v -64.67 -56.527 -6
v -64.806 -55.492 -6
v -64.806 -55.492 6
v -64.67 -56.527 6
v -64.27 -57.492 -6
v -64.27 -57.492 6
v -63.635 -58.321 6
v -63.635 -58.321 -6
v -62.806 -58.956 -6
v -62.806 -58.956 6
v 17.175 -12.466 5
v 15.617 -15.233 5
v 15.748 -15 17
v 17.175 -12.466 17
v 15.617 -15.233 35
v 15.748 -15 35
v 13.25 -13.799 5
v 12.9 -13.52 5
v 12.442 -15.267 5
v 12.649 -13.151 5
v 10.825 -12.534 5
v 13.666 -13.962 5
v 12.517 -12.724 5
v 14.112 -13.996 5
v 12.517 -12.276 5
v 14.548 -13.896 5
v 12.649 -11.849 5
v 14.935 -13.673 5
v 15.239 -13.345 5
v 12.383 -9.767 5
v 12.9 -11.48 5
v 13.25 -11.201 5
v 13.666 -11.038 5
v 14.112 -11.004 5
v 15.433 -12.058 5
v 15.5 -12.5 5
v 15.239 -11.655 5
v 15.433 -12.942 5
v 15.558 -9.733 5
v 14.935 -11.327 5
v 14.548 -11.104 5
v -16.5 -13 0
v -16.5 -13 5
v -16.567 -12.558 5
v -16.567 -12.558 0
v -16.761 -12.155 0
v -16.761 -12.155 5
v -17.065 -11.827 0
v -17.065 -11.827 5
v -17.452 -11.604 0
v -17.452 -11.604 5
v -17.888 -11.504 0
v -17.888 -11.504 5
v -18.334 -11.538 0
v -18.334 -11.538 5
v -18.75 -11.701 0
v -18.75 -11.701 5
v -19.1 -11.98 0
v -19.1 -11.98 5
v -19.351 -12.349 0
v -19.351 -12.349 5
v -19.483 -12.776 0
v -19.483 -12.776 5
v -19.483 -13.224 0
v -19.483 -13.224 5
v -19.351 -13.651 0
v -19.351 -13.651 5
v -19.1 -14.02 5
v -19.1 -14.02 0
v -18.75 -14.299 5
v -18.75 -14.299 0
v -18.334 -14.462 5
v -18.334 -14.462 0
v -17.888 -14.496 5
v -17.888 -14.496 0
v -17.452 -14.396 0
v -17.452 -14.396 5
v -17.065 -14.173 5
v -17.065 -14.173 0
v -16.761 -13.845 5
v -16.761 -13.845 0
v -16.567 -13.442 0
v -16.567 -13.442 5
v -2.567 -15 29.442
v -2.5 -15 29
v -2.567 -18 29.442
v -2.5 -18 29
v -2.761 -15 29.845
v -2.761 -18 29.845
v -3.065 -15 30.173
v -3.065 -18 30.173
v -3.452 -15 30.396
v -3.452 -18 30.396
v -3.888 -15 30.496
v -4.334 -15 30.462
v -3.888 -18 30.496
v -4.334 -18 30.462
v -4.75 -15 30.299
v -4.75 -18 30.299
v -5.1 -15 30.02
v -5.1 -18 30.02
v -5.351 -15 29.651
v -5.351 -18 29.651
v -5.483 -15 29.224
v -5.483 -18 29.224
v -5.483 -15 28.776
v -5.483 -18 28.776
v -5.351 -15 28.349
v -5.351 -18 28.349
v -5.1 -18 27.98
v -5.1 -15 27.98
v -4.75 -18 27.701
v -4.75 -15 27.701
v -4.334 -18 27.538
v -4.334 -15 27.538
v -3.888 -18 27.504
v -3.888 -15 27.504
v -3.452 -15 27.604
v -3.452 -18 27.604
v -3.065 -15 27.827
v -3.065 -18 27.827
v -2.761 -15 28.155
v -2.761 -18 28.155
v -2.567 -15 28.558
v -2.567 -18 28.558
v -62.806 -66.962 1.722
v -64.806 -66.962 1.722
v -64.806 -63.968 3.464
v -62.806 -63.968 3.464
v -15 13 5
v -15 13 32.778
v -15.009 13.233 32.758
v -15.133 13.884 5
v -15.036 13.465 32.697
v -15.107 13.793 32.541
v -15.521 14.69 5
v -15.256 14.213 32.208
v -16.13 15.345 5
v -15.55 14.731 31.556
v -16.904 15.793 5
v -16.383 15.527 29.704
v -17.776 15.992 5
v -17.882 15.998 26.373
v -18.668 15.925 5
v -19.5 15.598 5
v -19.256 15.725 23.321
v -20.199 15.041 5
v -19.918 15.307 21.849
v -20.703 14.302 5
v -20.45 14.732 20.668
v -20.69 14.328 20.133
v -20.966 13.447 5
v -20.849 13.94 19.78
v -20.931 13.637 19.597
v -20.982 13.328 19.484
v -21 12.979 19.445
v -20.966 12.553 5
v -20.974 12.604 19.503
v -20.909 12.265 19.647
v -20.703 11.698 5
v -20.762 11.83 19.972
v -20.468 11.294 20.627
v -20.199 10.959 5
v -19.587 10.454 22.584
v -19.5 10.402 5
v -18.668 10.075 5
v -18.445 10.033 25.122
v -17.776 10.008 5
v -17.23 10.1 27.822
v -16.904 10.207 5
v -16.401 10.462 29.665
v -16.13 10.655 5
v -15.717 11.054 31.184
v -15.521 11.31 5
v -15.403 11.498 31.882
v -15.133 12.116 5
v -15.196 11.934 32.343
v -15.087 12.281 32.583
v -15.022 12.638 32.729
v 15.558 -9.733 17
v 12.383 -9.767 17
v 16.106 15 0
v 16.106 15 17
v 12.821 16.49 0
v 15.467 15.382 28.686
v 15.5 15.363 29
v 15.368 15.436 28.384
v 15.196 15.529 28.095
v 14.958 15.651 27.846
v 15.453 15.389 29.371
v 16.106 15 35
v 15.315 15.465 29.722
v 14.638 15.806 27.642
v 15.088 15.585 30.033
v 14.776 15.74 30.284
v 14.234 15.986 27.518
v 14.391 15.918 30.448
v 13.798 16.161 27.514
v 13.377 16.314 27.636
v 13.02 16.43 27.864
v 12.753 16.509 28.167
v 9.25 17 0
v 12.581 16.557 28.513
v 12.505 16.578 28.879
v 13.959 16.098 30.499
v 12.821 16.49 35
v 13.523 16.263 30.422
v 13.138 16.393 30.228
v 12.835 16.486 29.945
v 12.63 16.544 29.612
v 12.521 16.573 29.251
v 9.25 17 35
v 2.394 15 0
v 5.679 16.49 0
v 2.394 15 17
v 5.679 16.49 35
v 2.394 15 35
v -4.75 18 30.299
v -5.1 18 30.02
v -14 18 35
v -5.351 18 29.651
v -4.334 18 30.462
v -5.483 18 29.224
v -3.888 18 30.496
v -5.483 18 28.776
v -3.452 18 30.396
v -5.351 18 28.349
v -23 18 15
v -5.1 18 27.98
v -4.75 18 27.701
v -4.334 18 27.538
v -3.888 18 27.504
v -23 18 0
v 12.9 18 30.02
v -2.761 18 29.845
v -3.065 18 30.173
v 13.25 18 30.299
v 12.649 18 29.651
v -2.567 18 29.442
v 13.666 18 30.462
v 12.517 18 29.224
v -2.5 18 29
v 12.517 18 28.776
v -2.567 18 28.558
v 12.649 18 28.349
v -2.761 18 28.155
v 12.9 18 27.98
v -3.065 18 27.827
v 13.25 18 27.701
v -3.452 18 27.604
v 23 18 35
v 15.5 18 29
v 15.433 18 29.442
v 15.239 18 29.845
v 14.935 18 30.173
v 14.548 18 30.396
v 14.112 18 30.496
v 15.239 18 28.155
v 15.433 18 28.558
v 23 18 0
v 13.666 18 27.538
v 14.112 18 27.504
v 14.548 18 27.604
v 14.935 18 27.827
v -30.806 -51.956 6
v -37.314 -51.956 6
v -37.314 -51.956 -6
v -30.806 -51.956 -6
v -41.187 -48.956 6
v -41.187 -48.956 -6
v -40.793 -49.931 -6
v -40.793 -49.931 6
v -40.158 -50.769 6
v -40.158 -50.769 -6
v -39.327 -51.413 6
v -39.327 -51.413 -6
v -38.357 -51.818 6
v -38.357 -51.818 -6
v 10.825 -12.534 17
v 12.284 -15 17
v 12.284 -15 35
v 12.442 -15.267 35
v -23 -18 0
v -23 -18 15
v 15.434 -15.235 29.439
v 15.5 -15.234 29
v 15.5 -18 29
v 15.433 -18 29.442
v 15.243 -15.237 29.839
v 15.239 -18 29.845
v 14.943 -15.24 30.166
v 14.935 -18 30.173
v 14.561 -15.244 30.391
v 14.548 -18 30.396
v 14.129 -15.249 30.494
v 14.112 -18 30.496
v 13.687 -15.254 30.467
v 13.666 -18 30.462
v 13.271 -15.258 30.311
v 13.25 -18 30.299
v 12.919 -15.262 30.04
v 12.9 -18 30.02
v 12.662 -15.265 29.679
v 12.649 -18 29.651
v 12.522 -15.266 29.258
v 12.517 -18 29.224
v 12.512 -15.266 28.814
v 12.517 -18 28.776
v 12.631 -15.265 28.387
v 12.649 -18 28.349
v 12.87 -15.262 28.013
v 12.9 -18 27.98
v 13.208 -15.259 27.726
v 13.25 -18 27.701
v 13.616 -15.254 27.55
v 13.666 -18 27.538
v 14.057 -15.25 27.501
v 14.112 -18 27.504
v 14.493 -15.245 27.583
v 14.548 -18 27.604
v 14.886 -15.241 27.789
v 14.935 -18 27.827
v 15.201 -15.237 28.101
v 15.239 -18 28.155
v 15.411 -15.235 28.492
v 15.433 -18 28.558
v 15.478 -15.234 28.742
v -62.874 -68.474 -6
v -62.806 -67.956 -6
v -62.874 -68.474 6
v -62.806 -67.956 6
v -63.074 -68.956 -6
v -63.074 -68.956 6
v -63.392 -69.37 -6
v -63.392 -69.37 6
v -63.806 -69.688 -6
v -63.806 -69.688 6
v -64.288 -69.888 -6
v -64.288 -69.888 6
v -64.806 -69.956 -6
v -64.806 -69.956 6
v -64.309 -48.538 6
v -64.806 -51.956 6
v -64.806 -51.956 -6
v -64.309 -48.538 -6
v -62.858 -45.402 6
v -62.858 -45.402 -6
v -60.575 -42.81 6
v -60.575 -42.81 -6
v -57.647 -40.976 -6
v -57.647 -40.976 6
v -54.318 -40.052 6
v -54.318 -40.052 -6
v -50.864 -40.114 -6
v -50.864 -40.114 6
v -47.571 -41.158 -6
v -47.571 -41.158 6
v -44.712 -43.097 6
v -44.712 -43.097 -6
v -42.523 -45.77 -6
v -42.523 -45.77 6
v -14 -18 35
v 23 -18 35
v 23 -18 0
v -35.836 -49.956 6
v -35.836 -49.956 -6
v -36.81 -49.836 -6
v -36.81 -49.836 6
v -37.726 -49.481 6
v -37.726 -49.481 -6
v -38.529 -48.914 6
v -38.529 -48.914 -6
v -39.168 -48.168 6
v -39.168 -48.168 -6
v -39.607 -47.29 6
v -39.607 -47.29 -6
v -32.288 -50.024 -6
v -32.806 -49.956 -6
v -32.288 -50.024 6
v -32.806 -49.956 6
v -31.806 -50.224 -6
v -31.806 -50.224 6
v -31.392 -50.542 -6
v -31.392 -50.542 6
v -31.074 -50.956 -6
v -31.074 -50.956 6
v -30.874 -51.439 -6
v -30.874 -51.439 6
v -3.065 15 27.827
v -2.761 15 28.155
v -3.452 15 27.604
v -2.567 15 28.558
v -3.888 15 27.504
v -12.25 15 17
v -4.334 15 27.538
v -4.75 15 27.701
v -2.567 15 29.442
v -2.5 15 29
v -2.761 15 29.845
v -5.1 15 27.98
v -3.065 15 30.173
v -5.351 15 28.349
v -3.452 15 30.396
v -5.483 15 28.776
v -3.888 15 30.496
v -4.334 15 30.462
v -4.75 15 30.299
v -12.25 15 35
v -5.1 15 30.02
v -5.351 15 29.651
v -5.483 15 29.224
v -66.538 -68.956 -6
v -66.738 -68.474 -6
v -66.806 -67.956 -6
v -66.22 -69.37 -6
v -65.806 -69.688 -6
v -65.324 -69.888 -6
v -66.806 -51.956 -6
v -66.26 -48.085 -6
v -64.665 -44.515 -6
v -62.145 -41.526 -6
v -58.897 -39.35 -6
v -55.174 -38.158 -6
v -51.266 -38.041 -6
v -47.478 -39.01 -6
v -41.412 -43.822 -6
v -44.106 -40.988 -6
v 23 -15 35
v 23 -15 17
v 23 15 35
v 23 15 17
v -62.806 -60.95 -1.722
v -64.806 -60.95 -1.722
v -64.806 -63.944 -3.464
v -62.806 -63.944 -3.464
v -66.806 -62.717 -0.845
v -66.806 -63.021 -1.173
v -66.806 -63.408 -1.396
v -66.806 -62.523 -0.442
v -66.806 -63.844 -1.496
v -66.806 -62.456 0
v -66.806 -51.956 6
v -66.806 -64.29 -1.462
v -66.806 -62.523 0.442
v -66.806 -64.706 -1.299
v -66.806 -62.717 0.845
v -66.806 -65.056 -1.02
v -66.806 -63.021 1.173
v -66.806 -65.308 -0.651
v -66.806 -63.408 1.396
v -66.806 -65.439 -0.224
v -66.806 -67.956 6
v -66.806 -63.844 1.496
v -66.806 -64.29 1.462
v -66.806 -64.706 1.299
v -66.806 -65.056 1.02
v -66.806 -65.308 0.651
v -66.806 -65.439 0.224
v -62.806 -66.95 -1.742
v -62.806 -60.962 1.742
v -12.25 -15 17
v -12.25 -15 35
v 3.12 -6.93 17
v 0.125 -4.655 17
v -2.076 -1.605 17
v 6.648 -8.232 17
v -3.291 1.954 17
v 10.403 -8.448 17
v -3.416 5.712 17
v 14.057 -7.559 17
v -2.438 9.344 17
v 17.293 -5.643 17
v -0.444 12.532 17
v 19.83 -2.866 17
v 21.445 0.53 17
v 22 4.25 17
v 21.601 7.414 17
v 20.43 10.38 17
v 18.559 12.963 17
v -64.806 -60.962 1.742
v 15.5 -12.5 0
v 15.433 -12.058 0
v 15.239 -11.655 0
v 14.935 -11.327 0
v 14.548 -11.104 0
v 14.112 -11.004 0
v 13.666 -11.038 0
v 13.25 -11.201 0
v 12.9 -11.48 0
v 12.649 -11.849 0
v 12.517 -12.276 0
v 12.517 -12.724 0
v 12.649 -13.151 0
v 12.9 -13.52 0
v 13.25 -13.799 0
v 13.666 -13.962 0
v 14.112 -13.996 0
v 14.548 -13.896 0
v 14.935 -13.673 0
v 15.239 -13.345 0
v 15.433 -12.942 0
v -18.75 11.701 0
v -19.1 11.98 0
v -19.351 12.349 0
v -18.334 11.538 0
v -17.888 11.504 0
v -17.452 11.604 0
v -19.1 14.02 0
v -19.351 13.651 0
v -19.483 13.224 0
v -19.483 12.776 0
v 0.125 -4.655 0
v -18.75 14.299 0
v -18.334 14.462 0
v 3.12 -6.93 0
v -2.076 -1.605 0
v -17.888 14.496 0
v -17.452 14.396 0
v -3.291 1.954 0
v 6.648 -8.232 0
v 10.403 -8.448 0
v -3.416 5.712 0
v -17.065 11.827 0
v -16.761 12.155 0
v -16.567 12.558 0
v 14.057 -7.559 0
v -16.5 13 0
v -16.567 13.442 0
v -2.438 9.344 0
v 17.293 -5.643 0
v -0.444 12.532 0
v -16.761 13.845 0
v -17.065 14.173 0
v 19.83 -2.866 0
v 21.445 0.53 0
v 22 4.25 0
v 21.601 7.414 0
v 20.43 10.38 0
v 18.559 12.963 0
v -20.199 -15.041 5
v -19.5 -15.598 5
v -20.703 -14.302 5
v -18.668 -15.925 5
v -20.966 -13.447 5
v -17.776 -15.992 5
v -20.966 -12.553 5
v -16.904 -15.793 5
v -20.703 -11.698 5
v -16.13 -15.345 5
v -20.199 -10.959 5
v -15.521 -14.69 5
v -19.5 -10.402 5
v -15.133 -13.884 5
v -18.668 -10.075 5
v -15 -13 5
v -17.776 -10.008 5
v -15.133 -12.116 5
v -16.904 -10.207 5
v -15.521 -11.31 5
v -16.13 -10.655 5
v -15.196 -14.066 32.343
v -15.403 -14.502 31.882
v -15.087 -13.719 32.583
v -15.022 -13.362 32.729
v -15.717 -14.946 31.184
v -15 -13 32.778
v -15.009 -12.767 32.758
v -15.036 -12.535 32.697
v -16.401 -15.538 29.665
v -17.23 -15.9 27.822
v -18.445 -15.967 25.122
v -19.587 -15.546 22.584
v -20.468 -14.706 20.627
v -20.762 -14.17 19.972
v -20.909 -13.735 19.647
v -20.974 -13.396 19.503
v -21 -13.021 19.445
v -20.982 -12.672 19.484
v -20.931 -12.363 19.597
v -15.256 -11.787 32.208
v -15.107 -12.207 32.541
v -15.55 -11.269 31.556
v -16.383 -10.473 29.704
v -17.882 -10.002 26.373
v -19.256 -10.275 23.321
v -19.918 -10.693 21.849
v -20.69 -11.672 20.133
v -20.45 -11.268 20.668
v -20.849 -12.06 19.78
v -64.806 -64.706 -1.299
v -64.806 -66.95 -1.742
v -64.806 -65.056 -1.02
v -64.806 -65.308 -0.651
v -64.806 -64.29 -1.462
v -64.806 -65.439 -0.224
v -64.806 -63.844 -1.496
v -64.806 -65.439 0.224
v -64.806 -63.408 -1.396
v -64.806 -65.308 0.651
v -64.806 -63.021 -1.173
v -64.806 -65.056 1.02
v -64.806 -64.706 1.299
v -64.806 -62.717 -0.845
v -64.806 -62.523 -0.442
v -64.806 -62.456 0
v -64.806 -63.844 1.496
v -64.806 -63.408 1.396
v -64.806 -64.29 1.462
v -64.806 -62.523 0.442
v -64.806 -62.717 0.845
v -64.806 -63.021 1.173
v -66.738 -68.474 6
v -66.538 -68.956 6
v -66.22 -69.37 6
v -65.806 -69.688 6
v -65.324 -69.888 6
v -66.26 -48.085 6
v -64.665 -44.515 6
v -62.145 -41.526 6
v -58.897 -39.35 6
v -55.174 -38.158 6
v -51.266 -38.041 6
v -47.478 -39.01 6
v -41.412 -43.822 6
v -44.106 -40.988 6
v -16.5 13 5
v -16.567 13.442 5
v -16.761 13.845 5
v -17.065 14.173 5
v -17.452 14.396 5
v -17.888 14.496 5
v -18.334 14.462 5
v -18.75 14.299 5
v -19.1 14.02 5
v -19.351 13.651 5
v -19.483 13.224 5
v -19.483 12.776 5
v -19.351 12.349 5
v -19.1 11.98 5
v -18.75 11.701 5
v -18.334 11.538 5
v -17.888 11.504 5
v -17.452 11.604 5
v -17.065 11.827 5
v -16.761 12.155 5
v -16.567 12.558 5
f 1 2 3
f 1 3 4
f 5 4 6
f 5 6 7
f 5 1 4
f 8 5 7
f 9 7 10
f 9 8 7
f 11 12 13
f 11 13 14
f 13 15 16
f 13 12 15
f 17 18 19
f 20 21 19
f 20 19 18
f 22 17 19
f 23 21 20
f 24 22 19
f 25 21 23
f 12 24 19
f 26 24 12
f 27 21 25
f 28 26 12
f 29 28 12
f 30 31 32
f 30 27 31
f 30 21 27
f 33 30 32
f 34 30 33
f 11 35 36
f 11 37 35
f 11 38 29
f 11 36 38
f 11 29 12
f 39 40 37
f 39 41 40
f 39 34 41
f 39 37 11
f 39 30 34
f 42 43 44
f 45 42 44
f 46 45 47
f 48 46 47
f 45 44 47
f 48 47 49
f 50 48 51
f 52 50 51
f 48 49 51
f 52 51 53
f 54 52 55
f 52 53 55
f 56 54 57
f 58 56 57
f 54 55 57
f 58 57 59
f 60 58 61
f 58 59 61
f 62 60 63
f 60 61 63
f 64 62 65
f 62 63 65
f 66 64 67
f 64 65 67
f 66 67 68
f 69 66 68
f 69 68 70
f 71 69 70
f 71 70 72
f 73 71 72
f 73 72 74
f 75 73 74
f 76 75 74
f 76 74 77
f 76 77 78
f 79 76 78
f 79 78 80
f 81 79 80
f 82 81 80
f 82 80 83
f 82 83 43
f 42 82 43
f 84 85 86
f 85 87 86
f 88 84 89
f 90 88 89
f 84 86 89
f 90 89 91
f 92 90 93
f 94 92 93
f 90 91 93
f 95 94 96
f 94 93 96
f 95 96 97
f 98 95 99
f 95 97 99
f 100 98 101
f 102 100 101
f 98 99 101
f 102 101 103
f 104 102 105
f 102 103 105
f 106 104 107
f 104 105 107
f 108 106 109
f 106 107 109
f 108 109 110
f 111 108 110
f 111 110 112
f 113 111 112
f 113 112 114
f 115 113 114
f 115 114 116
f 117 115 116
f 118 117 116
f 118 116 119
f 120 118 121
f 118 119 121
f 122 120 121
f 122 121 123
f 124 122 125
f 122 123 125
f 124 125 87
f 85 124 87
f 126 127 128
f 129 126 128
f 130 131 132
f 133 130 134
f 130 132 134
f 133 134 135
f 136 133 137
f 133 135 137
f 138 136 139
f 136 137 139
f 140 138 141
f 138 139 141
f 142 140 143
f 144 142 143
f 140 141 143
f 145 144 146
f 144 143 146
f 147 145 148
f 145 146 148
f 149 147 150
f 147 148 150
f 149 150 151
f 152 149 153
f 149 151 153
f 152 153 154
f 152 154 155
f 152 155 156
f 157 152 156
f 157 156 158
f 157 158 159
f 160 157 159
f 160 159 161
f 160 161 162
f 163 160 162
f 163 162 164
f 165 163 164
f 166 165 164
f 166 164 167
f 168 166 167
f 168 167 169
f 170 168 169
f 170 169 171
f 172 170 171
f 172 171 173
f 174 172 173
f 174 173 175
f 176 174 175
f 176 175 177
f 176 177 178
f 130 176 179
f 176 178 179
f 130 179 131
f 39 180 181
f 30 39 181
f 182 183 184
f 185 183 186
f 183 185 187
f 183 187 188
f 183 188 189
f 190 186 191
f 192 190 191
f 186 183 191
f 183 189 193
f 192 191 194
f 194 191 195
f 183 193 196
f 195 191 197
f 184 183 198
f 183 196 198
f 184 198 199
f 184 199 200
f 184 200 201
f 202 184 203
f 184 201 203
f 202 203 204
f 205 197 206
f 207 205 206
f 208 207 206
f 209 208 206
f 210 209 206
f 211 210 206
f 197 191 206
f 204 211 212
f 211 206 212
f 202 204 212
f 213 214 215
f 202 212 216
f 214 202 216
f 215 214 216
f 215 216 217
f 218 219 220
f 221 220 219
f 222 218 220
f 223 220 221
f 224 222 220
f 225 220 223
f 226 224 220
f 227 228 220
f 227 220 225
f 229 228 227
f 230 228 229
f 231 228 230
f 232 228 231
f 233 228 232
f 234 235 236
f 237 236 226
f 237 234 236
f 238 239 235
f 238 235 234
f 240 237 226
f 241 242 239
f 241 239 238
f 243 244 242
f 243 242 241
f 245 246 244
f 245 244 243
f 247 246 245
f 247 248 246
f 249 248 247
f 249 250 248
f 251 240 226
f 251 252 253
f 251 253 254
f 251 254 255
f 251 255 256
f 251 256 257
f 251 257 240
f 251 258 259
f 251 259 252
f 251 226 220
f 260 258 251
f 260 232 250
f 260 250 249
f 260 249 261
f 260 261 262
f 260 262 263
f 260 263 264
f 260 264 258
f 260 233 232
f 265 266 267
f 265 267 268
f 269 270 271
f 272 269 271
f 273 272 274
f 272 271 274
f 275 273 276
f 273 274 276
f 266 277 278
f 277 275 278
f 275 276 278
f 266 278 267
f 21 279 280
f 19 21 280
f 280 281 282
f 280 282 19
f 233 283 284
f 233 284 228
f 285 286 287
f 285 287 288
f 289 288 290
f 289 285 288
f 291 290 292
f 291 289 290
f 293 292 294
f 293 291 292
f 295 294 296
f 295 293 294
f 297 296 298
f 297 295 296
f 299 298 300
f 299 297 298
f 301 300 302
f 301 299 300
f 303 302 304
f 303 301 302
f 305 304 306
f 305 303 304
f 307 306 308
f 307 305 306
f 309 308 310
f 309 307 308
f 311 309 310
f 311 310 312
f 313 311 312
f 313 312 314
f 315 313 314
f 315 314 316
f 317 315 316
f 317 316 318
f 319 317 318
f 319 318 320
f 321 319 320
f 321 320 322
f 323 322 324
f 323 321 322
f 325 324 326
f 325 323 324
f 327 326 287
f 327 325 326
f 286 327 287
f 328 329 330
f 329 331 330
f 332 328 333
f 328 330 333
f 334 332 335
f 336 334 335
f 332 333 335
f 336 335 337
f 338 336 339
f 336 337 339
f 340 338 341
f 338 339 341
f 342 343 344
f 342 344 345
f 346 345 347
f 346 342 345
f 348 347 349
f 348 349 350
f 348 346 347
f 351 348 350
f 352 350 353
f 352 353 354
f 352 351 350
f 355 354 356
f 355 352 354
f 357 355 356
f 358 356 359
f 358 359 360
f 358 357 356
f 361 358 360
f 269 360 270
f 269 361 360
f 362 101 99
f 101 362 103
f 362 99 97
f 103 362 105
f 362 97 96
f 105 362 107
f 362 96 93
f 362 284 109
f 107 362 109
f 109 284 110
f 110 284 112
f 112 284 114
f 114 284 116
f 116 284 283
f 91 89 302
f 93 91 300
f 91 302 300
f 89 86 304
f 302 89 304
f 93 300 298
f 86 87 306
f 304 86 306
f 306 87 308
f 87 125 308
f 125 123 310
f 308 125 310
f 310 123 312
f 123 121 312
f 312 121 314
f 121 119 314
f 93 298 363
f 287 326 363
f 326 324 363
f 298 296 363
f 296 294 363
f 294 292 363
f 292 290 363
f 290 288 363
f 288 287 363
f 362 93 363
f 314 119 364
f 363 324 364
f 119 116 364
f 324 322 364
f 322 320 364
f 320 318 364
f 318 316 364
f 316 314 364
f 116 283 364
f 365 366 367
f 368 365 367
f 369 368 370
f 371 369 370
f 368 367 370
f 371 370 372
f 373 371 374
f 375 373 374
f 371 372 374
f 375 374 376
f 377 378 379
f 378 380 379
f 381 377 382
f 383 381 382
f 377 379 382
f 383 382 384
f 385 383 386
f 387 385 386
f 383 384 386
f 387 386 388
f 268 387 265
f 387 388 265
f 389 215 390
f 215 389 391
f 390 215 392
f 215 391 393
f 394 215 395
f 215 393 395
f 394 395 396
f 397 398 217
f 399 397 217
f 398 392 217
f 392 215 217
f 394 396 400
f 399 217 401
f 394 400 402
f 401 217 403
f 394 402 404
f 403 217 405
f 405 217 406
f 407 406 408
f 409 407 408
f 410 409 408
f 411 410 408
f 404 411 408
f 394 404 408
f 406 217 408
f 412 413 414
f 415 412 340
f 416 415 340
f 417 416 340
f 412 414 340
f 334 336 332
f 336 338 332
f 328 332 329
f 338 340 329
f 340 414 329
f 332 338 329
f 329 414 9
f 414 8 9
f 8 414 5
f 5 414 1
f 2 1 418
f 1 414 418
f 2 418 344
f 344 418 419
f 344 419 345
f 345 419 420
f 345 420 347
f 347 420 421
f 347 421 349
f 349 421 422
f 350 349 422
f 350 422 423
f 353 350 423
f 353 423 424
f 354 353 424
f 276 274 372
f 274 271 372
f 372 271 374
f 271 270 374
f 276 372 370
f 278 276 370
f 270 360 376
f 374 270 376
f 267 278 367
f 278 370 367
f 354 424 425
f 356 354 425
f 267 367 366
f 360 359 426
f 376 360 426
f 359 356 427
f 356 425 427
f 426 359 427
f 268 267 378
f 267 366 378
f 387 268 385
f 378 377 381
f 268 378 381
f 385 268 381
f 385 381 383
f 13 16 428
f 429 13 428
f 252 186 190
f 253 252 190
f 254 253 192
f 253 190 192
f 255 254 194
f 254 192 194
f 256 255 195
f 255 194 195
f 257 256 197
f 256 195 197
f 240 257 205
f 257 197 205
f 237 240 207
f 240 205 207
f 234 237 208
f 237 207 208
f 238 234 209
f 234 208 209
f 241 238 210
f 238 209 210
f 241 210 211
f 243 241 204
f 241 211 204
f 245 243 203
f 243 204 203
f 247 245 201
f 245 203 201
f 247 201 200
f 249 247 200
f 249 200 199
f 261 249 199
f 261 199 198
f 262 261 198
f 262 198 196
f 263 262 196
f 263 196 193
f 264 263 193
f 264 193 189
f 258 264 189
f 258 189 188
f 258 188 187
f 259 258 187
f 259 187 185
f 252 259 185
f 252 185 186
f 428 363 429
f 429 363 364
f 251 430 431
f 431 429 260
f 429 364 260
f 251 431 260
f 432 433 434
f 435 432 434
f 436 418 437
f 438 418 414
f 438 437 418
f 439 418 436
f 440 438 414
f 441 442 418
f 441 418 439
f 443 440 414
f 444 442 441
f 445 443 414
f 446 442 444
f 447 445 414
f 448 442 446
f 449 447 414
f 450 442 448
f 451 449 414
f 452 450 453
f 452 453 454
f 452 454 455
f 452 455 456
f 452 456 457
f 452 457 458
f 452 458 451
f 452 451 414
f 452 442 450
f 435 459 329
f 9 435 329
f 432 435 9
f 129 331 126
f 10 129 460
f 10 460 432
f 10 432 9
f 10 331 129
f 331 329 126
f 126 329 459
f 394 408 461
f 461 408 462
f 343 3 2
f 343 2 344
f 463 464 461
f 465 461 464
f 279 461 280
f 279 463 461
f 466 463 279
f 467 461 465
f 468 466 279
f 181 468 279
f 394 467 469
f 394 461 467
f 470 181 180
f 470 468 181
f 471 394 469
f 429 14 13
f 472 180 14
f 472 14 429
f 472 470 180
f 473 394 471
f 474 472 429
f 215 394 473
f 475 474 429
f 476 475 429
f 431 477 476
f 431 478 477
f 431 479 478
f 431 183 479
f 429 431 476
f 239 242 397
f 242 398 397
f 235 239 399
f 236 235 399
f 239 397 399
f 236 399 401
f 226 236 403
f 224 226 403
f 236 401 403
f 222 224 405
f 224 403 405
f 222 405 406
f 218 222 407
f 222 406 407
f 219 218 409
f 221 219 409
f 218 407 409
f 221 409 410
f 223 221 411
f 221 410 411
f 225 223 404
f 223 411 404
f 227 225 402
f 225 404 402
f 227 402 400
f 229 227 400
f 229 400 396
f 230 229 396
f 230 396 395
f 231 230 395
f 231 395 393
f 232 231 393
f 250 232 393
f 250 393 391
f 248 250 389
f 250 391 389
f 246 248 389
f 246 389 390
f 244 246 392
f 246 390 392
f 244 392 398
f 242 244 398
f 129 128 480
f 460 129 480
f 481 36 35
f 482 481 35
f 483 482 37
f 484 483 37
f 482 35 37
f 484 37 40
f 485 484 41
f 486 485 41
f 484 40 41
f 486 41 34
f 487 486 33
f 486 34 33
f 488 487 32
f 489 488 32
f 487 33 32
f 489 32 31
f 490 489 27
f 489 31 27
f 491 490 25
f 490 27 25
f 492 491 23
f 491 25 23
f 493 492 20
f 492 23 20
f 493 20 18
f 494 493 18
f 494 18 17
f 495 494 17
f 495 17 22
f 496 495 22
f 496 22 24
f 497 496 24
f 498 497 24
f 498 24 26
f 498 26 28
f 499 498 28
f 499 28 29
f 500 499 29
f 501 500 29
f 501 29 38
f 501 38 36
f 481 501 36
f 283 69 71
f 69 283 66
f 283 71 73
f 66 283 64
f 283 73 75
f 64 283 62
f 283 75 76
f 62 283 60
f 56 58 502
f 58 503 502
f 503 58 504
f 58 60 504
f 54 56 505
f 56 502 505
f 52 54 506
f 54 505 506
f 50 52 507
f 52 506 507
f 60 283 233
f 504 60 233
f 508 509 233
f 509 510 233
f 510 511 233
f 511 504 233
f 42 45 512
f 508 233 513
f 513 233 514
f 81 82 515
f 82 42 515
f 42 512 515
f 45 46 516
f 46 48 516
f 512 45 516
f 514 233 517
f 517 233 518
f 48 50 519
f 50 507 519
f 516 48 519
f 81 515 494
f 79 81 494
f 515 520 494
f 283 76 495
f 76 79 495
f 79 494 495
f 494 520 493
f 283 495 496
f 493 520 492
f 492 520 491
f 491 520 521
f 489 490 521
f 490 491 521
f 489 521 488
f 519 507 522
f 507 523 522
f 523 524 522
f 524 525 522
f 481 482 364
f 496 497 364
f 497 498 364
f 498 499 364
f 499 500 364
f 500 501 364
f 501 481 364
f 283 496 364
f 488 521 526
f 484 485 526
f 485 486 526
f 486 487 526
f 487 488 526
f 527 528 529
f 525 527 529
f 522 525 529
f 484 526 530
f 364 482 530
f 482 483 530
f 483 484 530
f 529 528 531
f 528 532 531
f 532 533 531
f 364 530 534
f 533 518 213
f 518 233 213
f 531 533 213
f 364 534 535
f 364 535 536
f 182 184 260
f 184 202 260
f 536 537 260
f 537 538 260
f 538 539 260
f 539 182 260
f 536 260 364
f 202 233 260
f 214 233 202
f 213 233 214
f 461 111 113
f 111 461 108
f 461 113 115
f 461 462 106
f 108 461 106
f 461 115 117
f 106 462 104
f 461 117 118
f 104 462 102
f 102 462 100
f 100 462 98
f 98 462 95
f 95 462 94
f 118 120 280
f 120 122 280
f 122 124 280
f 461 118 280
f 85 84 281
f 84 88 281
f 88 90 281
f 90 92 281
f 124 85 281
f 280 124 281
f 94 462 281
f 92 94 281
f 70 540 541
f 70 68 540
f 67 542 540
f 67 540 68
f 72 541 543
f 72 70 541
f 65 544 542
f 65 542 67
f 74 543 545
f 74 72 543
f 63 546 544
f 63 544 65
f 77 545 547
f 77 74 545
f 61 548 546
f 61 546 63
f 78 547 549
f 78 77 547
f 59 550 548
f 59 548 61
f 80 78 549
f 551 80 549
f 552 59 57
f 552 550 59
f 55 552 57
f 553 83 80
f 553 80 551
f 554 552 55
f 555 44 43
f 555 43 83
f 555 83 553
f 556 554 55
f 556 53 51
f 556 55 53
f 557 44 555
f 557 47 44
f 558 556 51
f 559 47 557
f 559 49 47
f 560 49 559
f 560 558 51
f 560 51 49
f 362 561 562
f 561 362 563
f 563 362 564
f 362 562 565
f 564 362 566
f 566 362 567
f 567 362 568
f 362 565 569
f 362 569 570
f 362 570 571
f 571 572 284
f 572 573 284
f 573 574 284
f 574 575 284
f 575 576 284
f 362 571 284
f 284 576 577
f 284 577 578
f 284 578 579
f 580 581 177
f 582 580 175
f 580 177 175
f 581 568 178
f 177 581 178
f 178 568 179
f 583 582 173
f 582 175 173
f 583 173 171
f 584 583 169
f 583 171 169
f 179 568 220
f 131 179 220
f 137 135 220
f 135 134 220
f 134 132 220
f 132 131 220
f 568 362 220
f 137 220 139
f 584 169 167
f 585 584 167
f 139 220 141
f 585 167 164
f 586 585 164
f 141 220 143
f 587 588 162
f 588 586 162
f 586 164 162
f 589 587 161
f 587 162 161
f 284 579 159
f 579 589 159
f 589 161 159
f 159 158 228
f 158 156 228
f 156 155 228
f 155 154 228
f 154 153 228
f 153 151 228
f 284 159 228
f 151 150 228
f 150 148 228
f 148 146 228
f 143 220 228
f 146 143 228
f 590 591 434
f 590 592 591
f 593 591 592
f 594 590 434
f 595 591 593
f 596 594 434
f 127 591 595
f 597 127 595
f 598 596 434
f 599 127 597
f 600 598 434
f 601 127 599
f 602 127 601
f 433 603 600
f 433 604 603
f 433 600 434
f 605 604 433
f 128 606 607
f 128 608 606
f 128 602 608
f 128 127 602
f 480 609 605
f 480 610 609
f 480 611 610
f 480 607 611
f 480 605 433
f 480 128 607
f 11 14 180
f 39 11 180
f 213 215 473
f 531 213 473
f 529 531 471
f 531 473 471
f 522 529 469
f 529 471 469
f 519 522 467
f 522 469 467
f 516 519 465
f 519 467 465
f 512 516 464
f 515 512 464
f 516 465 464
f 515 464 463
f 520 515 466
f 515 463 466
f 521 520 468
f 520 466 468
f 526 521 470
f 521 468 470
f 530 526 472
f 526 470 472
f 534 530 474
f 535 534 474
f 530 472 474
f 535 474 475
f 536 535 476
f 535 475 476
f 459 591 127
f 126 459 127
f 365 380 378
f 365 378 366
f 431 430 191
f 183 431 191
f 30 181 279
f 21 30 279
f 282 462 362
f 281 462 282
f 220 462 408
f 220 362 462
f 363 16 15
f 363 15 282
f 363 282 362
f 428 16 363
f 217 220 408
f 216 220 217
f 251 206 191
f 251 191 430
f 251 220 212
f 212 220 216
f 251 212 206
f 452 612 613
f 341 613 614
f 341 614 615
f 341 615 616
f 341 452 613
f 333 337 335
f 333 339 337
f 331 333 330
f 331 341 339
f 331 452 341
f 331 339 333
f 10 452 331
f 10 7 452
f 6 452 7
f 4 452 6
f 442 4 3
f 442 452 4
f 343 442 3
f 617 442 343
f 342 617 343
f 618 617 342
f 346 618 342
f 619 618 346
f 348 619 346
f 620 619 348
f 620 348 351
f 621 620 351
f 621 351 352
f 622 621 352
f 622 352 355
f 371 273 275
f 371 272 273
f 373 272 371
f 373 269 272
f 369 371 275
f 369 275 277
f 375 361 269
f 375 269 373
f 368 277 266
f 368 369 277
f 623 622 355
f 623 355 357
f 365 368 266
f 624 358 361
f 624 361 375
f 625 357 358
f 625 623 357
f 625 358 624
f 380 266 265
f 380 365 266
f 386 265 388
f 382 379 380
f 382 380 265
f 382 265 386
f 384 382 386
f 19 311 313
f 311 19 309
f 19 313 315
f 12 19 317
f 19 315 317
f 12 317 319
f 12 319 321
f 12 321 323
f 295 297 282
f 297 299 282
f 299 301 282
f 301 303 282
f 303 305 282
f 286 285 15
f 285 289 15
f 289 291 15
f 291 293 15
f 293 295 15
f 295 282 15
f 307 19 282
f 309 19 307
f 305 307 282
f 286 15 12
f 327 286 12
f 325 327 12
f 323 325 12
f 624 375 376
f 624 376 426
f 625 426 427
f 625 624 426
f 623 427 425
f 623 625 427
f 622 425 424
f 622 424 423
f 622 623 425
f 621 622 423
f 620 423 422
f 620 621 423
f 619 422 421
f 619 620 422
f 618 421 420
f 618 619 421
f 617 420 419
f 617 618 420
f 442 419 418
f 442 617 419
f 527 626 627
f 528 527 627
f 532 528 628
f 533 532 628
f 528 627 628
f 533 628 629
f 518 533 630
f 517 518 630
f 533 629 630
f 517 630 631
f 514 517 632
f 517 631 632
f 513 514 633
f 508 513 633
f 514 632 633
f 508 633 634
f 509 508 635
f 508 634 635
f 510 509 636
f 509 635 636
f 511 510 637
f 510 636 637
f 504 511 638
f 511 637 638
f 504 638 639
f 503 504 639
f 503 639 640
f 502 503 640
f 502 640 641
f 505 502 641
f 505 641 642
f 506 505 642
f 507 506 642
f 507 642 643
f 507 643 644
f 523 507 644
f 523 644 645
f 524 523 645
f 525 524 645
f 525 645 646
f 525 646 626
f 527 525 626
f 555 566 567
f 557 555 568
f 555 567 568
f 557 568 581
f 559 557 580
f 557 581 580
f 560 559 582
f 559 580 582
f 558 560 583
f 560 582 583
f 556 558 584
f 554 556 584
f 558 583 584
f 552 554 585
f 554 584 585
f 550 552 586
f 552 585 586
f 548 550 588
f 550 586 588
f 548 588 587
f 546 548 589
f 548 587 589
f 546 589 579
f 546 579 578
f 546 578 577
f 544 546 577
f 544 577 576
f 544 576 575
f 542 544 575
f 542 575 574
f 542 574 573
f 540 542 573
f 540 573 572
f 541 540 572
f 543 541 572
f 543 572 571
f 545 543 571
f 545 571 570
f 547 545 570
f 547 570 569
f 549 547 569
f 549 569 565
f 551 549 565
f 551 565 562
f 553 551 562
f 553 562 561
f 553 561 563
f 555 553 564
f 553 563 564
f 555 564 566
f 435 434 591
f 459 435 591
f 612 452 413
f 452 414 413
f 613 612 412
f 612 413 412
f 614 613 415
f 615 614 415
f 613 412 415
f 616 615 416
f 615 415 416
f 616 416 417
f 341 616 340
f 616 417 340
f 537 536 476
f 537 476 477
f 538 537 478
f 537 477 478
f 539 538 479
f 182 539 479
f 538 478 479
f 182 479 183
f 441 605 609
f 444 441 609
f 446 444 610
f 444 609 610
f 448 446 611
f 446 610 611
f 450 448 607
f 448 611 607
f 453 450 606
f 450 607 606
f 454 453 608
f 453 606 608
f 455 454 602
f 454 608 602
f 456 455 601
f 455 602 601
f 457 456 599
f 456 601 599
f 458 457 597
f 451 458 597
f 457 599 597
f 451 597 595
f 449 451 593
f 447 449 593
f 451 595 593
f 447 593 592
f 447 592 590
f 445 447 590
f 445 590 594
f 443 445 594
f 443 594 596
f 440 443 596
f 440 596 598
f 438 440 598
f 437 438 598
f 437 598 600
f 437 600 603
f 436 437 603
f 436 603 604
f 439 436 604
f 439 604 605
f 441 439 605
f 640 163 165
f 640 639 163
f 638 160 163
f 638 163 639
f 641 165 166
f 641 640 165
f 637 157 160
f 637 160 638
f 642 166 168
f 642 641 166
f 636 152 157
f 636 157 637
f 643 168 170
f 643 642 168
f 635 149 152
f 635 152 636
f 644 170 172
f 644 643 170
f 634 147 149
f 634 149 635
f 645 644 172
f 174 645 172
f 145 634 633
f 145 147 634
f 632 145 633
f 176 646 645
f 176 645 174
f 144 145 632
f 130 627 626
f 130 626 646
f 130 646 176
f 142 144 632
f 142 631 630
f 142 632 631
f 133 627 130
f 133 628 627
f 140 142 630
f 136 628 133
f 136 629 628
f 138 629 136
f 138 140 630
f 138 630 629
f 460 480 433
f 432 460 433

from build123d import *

# Parameters (mm, degrees)
F0_W         = 46
F0_H         = 36
F1_DEPTH     = 35
F2_R         = 1.5
F3_DEPTH     = 50
F2_R_2       = 3
F4_DEPTH     = 30
F6_DEPTH     = 18
F8_DEPTH     = 25
F9_R         = 1.5
F10_DEPTH    = 50
F11_T1_DEPTH = 139.6606830198
F13_DEPTH    = 6
F14_W        = 11
F14_H        = 12
F15_DEPTH    = 2
F14_R        = 1.5
F16_DEPTH    = 25
F17_T1_DEPTH = 12
F17_T3_DEPTH = 12
F17_T5_DEPTH = 29.4596669241
F18_R        = 1.99999


# Not quite as in the source:
# - a fillet or chamfer that OpenCascade refuses, or shapes differently, is made with other operations: its cross-section is extruded or revolved along the edge and cut away or added
# - a fillet or chamfer is up to 0.001 mm smaller than in the source, because OpenCascade refuses the exact size
# - a feature names something its author has since deleted; it is built from what else it names


with BuildPart() as f1:
    # F0 (on Top) → F1 (new body)
    with BuildSketch(Plane.XY):
        Rectangle(F0_W, F0_H)
    extrude(amount=F1_DEPTH)

    # F2 (on face) → F3 (cut)
    with BuildSketch(Plane.XY.offset(35)):
        with Locations((-18, 13)):
            Circle(F2_R)
        with Locations((-18, -13)):
            Circle(F2_R)
        with Locations((14, -12.5)):
            Circle(F2_R)
    extrude(amount=-F3_DEPTH, mode=Mode.SUBTRACT)

    # F2 (on face) → F4 (cut)
    with BuildSketch(Plane.XY.offset(35)):
        with Locations((-18, 13)):
            Circle(F2_R_2)
        with Locations((-18, 13)):
            Circle(F2_R, mode=Mode.SUBTRACT)
        with Locations((-18, -13)):
            Circle(F2_R_2)
        with Locations((-18, -13)):
            Circle(F2_R, mode=Mode.SUBTRACT)
        Polygon((10.8247584463, -12.5342696548), (12.4420576148, -15.266974676), (15.6172991685, -15.2327050212), (17.1752415537, -12.4657303452), (15.5579423852, -9.733025324), (12.3827008315, -9.7672949788), align=None)
        with Locations((14, -12.5)):
            Circle(F2_R, mode=Mode.SUBTRACT)
    extrude(amount=-F4_DEPTH, mode=Mode.SUBTRACT)

    # F5 (on face) → F6 (cut)
    with BuildSketch(Plane.XY.offset(35)):
        Polygon((15.7483235031, -15), (23, -15), (23, 15), (-12.25, 15), (-12.25, -15), (12.2840537621, -15), (10.8247584463, -12.5342696548), (12.3827008315, -9.7672949788), (15.5579423852, -9.733025324), (17.1752415537, -12.4657303452), align=None)
    extrude(amount=-F6_DEPTH, mode=Mode.SUBTRACT)

    # F7 (on face) → F8 (cut, symmetric)
    with BuildSketch(Plane.XY.offset(17)):
        with BuildLine():
            Line((2.3943453996, 15), (16.1056546004, 15))
            ThreePointArc((16.1056546004, 15), (9.25, 17), (2.3943453996, 15))
        make_face()
        with BuildLine():
            ThreePointArc((2.3943453996, 15), (3.120036548, -6.9297159211), (22, 4.25))
            ThreePointArc((22, 4.25), (20.4297159211, 10.379963452), (16.1056546004, 15))
            Line((16.1056546004, 15), (2.3943453996, 15))
        make_face()
    extrude(amount=F8_DEPTH, both=True, mode=Mode.SUBTRACT)

    # F9 (on face) → F10 (cut, symmetric)
    with BuildSketch(Plane.XZ.offset(-15)):
        with Locations((14, 29)):
            Circle(F9_R)
        with Locations((-4, 29)):
            Circle(F9_R)
    extrude(amount=F10_DEPTH, both=True, mode=Mode.SUBTRACT)

    # F11: chamfer of 9 x 20 on 1 edges, made by hand

    # F11_s2 → F11_t1 (cut)
    with BuildSketch(Plane.XZ.offset(-69.8303415099)):
        Polygon((-14, 35), (-23, 15), (-23, 35), align=None)
    extrude(amount=F11_T1_DEPTH, mode=Mode.SUBTRACT)


with BuildPart() as f13:
    # F12 (on Top) → F13 (new body, symmetric)
    with BuildSketch(Plane.XY):
        with BuildLine():
            ThreePointArc((-64.8061240633, -51.9561834335), (-52.8061240633, -39.9561834335), (-40.8061240633, -51.9561834335))
            Line((-40.8061240633, -51.9561834335), (-40.8061240633, -49.9561834335))
            Line((-40.8061240633, -49.9561834335), (-38.9497176027, -49.9561834335))
            ThreePointArc((-38.9497176027, -49.9561834335), (-53.8086981384, -37.9921279616), (-66.8061240633, -51.9561834335))
            Line((-66.8061240633, -51.9561834335), (-64.8061240633, -51.9561834335))
        make_face()
        with BuildLine():
            ThreePointArc((-38.9497176027, -49.9561834335), (-38.8420685913, -50.9536093584), (-38.8061240633, -51.9561834335))
            Line((-38.8061240633, -51.9561834335), (-30.8061240633, -51.9561834335))
            Line((-30.8061240633, -51.9561834335), (-30.8061240633, -49.9561834335))
            Line((-30.8061240633, -49.9561834335), (-38.9497176027, -49.9561834335))
        make_face()
        with BuildLine():
            Line((-40.8061240633, -49.9561834335), (-40.8061240633, -51.9561834335))
            Line((-40.8061240633, -51.9561834335), (-38.8061240633, -51.9561834335))
            ThreePointArc((-38.8061240633, -51.9561834335), (-38.8420685913, -50.9536093584), (-38.9497176027, -49.9561834335))
            Line((-38.9497176027, -49.9561834335), (-40.8061240633, -49.9561834335))
        make_face()
        with BuildLine():
            Line((-64.8061240633, -59.1672859845), (-64.8061240633, -51.9561834335))
            Line((-64.8061240633, -51.9561834335), (-66.8061240633, -51.9561834335))
            ThreePointArc((-66.8061240633, -51.9561834335), (-66.2968616265, -55.6978408203), (-64.8061240633, -59.1672859845))
        make_face()
        with BuildLine():
            ThreePointArc((-64.8061240633, -59.1672859845), (-66.2968616265, -55.6978408203), (-66.8061240633, -51.9561834335))
            Line((-66.8061240633, -51.9561834335), (-66.8061240633, -69.9561834335))
            Line((-66.8061240633, -69.9561834335), (-64.8061240633, -69.9561834335))
            Line((-64.8061240633, -69.9561834335), (-64.8061240633, -59.1672859845))
        make_face()
    extrude(amount=F13_DEPTH, both=True)

    # F14 (on face) → F15 (join)
    with BuildSketch(Plane.YZ.offset(-64.8061240633)):
        with Locations((-64.4561834335, 0)):
            Rectangle(F14_W, F14_H)
        Polygon((-60.9620828312, 1.742268864), (-60.9502840359, -1.7218327511), (-63.9443846382, -3.4641016151), (-66.9502840359, -1.742268864), (-66.9620828312, 1.7218327511), (-63.9679822288, 3.4641016151), align=None, mode=Mode.SUBTRACT)
    extrude(amount=F15_DEPTH)

    # F14 (on face) → F16 (cut)
    with BuildSketch(Plane.YZ.offset(-64.8061240633)):
        with Locations((-63.9561834335, 0)):
            Circle(F14_R)
    extrude(amount=-F16_DEPTH, mode=Mode.SUBTRACT)

    # F17: fillet of radius 4 on 3 edges, made by hand

    # F17_s2 → F17_t1 (join)
    with BuildSketch(Plane.XY.offset(-6)):
        with BuildLine():
            ThreePointArc((-64.8061240633, -55.4920818184), (-64.2702256784, -57.4920818184), (-62.8061240633, -58.9561834335))
            Line((-62.8061240633, -58.9561834335), (-64.8061240633, -58.9561834335))
            Line((-64.8061240633, -58.9561834335), (-64.8061240633, -55.4920818184))
        make_face()
    extrude(amount=F17_T1_DEPTH)

    # F17_s4 → F17_t3 (join)
    with BuildSketch(Plane.XY.offset(-6)):
        with BuildLine():
            ThreePointArc((-35.8355613148, -49.9561834335), (-38.1449623915, -49.2221697572), (-39.6067974811, -47.2895167669))
            ThreePointArc((-39.6067974811, -47.2895167669), (-39.2127083631, -48.6066984578), (-38.9497176027, -49.9561834335))
            Line((-38.9497176027, -49.9561834335), (-35.8355613148, -49.9561834335))
        make_face()
    extrude(amount=F17_T3_DEPTH)

    # F17_s6 → F17_t5 (cut)
    with BuildSketch(Plane.XY.offset(-14.7298334621)):
        with BuildLine():
            ThreePointArc((-41.1871740246, -48.9561834335), (-39.7636804212, -51.1184610937), (-37.3141906784, -51.9561834335))
            Line((-37.3141906784, -51.9561834335), (-40.8061240633, -51.9561834335))
            ThreePointArc((-40.8061240633, -51.9561834335), (-40.9017677081, -50.4441319237), (-41.1871740246, -48.9561834335))
        make_face()
    extrude(amount=F17_T5_DEPTH, mode=Mode.SUBTRACT)

    # F18 (radius 2 in the source; OpenCascade refuses exactly that, so slightly less here)
    f18_edges = [f13.edges().sort_by_distance(p)[0] for p in [
        (-66.806124, -69.956183, 0),
        (-62.806124, -69.956183, 0),
        (-30.806124, -49.956183, 0),
    ]]
    fillet(f18_edges, radius=F18_R)


solid = Compound([f1.part, f13.part])
